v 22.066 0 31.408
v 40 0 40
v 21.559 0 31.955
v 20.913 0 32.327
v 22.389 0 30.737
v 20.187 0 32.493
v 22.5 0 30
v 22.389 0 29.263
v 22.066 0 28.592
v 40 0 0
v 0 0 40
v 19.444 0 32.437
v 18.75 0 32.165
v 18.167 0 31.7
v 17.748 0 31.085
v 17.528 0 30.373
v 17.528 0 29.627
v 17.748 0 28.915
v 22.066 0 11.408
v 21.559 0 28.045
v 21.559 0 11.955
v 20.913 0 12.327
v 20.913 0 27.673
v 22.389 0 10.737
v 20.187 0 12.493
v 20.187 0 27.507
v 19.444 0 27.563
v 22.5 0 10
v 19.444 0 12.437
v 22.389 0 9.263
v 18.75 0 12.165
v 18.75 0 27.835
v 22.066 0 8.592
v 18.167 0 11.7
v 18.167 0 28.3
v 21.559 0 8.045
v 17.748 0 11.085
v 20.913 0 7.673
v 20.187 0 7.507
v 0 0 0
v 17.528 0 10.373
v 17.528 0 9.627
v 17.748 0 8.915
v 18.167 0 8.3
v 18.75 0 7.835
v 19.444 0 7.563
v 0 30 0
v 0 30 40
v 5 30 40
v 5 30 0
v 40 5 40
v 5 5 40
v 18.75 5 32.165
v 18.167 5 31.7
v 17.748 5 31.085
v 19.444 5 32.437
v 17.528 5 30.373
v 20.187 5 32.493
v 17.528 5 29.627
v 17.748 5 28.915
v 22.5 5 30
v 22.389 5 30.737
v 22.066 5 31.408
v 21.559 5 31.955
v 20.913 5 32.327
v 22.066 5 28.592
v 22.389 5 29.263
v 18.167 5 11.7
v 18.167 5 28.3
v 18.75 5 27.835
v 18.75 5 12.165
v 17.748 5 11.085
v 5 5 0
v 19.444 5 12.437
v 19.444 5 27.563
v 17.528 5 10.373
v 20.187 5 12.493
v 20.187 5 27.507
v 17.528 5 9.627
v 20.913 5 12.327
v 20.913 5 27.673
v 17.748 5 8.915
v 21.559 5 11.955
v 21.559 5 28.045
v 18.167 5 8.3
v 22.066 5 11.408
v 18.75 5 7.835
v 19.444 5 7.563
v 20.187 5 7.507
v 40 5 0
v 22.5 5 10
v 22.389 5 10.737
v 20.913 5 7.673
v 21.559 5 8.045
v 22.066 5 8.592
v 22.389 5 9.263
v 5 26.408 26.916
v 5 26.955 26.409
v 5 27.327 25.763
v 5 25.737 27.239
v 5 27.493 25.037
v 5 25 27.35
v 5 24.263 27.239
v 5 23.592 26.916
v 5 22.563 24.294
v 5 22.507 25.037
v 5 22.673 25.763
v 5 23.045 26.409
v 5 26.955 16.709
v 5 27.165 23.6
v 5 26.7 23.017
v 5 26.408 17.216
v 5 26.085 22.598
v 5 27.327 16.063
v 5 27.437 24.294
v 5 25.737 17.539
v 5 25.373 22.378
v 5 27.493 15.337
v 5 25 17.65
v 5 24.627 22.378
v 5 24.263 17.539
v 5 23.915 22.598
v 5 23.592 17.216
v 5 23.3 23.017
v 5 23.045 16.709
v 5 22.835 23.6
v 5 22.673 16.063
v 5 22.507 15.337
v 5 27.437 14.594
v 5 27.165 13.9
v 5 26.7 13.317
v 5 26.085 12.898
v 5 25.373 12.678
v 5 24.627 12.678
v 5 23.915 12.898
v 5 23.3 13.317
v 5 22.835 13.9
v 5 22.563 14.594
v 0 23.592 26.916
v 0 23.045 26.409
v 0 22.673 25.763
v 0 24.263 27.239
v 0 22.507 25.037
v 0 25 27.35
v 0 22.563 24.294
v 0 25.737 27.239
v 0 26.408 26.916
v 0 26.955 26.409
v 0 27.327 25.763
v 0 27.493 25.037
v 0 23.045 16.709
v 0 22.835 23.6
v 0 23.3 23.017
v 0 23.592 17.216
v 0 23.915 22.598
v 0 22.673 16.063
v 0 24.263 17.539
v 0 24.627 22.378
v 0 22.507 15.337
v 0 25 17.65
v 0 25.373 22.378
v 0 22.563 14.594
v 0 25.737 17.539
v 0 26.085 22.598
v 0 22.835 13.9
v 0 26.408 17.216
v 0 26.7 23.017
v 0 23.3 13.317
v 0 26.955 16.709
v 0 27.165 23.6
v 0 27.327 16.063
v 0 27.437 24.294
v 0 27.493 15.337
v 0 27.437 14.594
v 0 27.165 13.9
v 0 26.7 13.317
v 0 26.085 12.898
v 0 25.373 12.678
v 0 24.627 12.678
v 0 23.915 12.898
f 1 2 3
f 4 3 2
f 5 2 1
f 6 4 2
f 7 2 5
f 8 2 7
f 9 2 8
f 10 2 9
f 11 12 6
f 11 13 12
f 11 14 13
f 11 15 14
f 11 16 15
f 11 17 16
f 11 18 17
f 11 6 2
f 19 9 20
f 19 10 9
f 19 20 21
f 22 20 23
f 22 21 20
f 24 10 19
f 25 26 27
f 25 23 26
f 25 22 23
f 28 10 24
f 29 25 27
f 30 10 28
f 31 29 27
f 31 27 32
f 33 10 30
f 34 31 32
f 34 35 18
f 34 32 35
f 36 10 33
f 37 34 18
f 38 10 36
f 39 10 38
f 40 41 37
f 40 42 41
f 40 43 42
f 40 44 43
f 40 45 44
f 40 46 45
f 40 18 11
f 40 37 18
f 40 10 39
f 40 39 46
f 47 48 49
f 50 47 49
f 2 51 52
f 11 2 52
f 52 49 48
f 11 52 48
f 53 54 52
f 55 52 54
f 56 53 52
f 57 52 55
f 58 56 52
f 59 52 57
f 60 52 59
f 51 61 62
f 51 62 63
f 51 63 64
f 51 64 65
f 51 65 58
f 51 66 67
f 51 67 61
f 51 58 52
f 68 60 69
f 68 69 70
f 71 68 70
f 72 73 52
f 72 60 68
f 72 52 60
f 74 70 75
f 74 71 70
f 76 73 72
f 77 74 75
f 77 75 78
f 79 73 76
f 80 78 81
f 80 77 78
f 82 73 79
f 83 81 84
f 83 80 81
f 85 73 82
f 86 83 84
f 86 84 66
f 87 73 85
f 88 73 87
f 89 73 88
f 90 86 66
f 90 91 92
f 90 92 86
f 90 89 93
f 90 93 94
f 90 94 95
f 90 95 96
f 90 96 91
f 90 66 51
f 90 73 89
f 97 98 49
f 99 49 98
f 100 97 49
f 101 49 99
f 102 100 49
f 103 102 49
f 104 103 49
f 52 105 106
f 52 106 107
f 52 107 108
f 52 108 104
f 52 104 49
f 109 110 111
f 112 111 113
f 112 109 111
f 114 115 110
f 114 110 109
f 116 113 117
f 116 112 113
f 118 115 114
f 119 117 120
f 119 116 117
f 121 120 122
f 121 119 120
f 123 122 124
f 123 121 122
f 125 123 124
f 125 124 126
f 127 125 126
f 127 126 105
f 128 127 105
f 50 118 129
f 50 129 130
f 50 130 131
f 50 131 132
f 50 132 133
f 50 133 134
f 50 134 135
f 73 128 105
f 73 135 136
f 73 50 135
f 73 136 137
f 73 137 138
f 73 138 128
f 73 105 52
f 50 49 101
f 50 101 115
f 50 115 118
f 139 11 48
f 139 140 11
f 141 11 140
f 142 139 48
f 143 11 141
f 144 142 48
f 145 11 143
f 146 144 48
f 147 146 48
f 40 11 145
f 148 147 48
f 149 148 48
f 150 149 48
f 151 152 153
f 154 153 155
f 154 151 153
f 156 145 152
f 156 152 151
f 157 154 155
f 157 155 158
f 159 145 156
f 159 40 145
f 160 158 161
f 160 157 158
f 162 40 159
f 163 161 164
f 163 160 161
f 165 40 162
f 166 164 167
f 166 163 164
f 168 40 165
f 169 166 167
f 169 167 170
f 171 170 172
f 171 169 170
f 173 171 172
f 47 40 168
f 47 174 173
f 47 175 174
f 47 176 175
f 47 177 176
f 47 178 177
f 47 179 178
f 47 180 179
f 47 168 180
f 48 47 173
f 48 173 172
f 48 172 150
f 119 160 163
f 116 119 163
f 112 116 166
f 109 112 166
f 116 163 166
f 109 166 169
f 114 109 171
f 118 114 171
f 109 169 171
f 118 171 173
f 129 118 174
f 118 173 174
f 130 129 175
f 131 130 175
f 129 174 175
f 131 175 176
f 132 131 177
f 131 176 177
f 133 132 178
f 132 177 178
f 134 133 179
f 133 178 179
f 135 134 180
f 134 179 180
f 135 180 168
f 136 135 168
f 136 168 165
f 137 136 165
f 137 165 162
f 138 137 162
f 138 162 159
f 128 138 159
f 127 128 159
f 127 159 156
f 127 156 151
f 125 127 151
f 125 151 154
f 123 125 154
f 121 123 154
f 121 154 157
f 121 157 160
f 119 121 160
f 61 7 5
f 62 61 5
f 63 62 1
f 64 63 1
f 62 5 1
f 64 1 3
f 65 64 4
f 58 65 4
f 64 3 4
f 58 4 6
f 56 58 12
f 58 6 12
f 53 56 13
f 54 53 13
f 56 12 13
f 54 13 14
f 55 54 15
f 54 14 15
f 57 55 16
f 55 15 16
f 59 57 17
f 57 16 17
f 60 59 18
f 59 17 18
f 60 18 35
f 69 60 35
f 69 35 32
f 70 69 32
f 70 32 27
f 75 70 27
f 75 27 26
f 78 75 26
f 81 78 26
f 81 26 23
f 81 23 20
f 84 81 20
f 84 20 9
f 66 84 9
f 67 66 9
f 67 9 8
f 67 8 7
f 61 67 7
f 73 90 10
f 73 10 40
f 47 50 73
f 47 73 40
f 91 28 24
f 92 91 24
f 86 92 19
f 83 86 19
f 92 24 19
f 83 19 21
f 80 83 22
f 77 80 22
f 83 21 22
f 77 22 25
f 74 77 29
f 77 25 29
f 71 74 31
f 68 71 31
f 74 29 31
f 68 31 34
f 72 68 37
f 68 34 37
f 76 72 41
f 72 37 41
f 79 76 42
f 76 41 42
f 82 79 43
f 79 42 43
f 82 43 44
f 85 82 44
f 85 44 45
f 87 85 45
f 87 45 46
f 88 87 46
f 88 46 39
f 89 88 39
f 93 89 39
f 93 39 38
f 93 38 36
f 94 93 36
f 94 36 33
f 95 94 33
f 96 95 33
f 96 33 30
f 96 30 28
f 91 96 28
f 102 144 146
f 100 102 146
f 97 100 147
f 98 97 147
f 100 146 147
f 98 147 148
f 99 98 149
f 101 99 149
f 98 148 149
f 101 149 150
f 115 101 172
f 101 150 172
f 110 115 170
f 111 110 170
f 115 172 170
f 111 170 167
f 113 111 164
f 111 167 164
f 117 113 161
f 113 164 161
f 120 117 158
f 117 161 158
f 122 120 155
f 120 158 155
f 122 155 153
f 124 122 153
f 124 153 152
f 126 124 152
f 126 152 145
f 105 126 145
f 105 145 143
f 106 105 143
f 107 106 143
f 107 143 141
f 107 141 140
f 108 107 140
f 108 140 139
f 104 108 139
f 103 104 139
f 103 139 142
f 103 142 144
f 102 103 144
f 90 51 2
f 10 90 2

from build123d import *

# Parameters (mm, degrees)
BOSS_EXTRUDE1_DEPTH = 40
SKETCH2_R           = 2.5
CUT_EXTRUDE1_DEPTH  = 40
SKETCH3_R           = 2.5
CUT_EXTRUDE2_DEPTH  = 40


with BuildPart() as part:
    # Sketch1 → Boss-Extrude1 (new body)
    with BuildSketch(Plane.XY):
        Polygon((0, 0), (0, 30), (5, 30), (5, 5), (40, 5), (40, 0), align=None)
    extrude(amount=BOSS_EXTRUDE1_DEPTH)

    # Sketch2 → Cut-Extrude1 (cut)
    with BuildSketch(Plane.ZY):
        with Locations((24.85, 25)):
            Circle(SKETCH2_R)
        with Locations((15.15, 25)):
            Circle(SKETCH2_R)
    extrude(amount=-CUT_EXTRUDE1_DEPTH, mode=Mode.SUBTRACT)

    # Sketch3 → Cut-Extrude2 (cut)
    with BuildSketch(Plane.XZ):
        with Locations((20, 30)):
            Circle(SKETCH3_R)
        with Locations((20, 10)):
            Circle(SKETCH3_R)
    extrude(amount=-CUT_EXTRUDE2_DEPTH, mode=Mode.SUBTRACT)


solid = part.part
